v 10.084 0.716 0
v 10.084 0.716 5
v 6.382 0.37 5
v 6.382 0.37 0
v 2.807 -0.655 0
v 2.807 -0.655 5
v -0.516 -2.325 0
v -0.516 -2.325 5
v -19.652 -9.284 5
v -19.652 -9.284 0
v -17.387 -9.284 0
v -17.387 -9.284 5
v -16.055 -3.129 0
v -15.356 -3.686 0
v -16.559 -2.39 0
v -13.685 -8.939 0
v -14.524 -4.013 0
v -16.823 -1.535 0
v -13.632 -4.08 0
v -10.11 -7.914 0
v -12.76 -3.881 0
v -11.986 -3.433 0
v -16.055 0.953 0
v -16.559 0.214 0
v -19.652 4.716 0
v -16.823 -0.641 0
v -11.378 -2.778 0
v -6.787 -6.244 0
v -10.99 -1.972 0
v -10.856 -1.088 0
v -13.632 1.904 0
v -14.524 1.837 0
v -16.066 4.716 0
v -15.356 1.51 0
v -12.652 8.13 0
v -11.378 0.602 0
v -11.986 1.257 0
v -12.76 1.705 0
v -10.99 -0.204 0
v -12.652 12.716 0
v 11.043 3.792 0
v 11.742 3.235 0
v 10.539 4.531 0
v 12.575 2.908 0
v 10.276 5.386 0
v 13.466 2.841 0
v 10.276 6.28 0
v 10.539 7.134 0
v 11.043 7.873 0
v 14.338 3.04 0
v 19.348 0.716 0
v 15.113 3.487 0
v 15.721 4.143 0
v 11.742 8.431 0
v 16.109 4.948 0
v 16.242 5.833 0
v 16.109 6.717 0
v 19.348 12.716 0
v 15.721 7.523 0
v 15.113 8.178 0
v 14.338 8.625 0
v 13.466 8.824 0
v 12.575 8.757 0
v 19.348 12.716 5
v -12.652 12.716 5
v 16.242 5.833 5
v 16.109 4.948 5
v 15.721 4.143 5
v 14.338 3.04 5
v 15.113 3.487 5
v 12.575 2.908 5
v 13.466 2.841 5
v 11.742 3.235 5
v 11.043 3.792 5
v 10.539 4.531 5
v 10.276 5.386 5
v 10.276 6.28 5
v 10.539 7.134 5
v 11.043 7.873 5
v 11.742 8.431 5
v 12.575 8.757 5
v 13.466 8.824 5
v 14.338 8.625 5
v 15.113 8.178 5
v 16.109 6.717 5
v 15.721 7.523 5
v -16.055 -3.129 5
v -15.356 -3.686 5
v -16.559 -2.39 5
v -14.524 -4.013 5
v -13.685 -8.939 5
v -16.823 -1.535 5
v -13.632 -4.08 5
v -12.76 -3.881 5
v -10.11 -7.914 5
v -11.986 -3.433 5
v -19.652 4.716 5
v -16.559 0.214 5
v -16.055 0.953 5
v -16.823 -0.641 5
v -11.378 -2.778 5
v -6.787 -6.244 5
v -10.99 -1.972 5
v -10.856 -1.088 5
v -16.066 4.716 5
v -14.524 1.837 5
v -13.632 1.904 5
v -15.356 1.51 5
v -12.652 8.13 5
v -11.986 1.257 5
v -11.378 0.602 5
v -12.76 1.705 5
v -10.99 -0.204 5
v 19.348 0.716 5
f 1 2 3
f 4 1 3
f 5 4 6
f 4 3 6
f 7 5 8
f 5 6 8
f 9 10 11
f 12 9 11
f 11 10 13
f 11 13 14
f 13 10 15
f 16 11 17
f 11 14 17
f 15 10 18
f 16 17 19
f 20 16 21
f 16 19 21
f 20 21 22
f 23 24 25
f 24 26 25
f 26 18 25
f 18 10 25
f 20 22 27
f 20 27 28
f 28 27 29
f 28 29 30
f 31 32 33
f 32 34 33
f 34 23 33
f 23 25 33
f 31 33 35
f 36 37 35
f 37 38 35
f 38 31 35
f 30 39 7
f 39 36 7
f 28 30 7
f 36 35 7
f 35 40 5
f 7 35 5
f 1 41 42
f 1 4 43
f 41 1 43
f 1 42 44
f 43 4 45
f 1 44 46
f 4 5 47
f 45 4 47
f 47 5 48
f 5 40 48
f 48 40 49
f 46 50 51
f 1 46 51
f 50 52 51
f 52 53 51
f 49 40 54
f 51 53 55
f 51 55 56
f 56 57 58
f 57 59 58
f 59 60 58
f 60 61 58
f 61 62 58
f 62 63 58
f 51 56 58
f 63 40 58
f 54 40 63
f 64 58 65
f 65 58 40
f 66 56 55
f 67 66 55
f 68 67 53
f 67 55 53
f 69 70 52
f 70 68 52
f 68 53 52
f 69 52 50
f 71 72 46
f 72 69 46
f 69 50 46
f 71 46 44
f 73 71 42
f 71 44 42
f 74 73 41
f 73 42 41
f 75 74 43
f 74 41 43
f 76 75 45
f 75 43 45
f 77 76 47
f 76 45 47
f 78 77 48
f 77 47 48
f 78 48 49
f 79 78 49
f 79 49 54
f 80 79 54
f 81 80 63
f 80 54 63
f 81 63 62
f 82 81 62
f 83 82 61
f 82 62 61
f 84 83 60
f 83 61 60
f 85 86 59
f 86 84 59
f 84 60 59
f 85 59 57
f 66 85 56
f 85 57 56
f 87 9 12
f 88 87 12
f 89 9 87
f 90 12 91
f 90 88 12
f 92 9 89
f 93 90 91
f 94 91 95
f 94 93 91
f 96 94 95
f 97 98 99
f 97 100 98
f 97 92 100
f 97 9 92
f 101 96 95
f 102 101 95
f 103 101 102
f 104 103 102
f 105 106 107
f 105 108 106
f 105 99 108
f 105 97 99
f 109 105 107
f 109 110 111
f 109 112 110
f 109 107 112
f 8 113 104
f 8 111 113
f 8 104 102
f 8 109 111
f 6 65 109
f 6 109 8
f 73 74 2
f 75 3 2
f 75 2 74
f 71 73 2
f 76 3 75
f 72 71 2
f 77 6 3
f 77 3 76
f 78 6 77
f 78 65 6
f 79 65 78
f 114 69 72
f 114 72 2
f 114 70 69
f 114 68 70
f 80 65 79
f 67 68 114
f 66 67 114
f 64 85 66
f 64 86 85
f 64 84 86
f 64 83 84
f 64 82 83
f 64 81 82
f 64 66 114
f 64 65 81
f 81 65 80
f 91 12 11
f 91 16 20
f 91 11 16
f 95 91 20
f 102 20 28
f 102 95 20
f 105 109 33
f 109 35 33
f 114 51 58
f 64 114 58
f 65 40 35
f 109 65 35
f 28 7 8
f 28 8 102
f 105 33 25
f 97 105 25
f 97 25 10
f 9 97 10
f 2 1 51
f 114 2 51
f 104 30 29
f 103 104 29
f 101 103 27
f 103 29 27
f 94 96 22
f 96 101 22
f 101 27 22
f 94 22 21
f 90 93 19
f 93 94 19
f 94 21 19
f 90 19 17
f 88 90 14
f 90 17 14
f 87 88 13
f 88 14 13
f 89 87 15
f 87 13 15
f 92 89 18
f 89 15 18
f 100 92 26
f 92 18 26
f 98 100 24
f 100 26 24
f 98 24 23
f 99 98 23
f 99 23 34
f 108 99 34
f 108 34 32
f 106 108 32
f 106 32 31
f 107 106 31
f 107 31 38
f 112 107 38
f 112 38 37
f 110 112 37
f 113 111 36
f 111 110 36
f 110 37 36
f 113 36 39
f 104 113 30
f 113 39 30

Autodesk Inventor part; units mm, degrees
ref_plane "YZ Plane" through (0, 0, 0) normal (1, 0, 0) x (0, 1, 0)
ref_plane "XZ Plane" through (0, 0, 0) normal (0, 1, 0) x (-1, 0, 0)
ref_plane "XY Plane" through (0, 0, 0) normal (0, 0, 1) x (1, 0, 0)
sketch "草图1" plane through (0, 0, 0) normal (0, 0, 1) x (1, 0, 0)
  line L0 (3.3485, 1.7155) -> (3.3485, -8.2845) projected
  line L1 (3.3485, -8.2845) -> (-18.6515, -8.2845) projected
  line L2 (-18.6515, -8.2845) -> (-18.6515, 3.7155) projected
  line L3 (-18.6515, 3.7155) -> (-15.6515, 3.7155) projected
  line L4 (-11.6515, 7.7155) -> (-15.6515, 3.7155) projected
  line L5 (-11.6515, 11.7155) -> (-11.6515, 7.7155) projected
  line L6 (18.3485, 11.7155) -> (-11.6515, 11.7155) projected
  line L7 (18.3485, 1.7155) -> (18.3485, 11.7155) projected
  line L8 (18.3485, 1.7155) -> (3.3485, 1.7155) projected
  circle A0 centre (13.2421, 5.8327) radius 3 projected
  circle A1 centre (-13.8563, -1.088) radius 3 projected
  line L9 (-12.6515, 12.7155) -> (-12.6515, 8.1297)
  line L10 (-12.6515, 8.1297) -> (-16.0657, 4.7155)
  line L11 (-16.0657, 4.7155) -> (-19.6515, 4.7155)
  line L12 (-19.6515, 4.7155) -> (-19.6515, -9.2845)
  line L13 (-19.6515, -9.2845) -> (4.3485, -9.2845)
  line L14 (4.3485, -9.2845) -> (4.3485, 0.7155)
  line L15 (4.3485, 0.7155) -> (19.3485, 0.7155)
  line L16 (19.3485, 0.7155) -> (19.3485, 12.7155)
  line L17 (19.3485, 12.7155) -> (-12.6515, 12.7155)
  dimension "d2" = 1
extrude "拉伸1" add sketch "草图1" along normal blind 5 contours L0 L1 L2 L3 L4 L5 L6 L7 L8 | L17 L16 L15 L14 L13 L12 L11 L10 L9
sketch "草图2" plane through (0, 0, 0) normal (0, 0, -1) x (-1, 0, 0)
  line L0 (3.2234, -5.6845) -> (-9.038, -5.6845) projected
  arc A0 (6.2234, -8.6845) -> (3.2234, -5.6845) centre (3.2234, -8.6845) ccw projected
  line L1 (-4.3485, -9.2845) -> (-4.3485, 0.7155) projected
  line L2 (-4.3485, 0.7155) -> (11.6515, -9.2845)
  line L3 (19.6515, -9.2845) -> (-4.3485, -9.2845) projected
  line L4 (19.6515, 4.7155) -> (19.6515, -9.2845) projected
  point P0 (0, 0)
  dimension "d5" = 8
extrude "拉伸2" cut sketch "草图2" against normal blind 5
fillet "圆角1" radius 20 2 edges at (4.3485, 0.7155, 2.5) (-11.6515, -9.2845, 2.5)
properties part number "阻挡X轴"
